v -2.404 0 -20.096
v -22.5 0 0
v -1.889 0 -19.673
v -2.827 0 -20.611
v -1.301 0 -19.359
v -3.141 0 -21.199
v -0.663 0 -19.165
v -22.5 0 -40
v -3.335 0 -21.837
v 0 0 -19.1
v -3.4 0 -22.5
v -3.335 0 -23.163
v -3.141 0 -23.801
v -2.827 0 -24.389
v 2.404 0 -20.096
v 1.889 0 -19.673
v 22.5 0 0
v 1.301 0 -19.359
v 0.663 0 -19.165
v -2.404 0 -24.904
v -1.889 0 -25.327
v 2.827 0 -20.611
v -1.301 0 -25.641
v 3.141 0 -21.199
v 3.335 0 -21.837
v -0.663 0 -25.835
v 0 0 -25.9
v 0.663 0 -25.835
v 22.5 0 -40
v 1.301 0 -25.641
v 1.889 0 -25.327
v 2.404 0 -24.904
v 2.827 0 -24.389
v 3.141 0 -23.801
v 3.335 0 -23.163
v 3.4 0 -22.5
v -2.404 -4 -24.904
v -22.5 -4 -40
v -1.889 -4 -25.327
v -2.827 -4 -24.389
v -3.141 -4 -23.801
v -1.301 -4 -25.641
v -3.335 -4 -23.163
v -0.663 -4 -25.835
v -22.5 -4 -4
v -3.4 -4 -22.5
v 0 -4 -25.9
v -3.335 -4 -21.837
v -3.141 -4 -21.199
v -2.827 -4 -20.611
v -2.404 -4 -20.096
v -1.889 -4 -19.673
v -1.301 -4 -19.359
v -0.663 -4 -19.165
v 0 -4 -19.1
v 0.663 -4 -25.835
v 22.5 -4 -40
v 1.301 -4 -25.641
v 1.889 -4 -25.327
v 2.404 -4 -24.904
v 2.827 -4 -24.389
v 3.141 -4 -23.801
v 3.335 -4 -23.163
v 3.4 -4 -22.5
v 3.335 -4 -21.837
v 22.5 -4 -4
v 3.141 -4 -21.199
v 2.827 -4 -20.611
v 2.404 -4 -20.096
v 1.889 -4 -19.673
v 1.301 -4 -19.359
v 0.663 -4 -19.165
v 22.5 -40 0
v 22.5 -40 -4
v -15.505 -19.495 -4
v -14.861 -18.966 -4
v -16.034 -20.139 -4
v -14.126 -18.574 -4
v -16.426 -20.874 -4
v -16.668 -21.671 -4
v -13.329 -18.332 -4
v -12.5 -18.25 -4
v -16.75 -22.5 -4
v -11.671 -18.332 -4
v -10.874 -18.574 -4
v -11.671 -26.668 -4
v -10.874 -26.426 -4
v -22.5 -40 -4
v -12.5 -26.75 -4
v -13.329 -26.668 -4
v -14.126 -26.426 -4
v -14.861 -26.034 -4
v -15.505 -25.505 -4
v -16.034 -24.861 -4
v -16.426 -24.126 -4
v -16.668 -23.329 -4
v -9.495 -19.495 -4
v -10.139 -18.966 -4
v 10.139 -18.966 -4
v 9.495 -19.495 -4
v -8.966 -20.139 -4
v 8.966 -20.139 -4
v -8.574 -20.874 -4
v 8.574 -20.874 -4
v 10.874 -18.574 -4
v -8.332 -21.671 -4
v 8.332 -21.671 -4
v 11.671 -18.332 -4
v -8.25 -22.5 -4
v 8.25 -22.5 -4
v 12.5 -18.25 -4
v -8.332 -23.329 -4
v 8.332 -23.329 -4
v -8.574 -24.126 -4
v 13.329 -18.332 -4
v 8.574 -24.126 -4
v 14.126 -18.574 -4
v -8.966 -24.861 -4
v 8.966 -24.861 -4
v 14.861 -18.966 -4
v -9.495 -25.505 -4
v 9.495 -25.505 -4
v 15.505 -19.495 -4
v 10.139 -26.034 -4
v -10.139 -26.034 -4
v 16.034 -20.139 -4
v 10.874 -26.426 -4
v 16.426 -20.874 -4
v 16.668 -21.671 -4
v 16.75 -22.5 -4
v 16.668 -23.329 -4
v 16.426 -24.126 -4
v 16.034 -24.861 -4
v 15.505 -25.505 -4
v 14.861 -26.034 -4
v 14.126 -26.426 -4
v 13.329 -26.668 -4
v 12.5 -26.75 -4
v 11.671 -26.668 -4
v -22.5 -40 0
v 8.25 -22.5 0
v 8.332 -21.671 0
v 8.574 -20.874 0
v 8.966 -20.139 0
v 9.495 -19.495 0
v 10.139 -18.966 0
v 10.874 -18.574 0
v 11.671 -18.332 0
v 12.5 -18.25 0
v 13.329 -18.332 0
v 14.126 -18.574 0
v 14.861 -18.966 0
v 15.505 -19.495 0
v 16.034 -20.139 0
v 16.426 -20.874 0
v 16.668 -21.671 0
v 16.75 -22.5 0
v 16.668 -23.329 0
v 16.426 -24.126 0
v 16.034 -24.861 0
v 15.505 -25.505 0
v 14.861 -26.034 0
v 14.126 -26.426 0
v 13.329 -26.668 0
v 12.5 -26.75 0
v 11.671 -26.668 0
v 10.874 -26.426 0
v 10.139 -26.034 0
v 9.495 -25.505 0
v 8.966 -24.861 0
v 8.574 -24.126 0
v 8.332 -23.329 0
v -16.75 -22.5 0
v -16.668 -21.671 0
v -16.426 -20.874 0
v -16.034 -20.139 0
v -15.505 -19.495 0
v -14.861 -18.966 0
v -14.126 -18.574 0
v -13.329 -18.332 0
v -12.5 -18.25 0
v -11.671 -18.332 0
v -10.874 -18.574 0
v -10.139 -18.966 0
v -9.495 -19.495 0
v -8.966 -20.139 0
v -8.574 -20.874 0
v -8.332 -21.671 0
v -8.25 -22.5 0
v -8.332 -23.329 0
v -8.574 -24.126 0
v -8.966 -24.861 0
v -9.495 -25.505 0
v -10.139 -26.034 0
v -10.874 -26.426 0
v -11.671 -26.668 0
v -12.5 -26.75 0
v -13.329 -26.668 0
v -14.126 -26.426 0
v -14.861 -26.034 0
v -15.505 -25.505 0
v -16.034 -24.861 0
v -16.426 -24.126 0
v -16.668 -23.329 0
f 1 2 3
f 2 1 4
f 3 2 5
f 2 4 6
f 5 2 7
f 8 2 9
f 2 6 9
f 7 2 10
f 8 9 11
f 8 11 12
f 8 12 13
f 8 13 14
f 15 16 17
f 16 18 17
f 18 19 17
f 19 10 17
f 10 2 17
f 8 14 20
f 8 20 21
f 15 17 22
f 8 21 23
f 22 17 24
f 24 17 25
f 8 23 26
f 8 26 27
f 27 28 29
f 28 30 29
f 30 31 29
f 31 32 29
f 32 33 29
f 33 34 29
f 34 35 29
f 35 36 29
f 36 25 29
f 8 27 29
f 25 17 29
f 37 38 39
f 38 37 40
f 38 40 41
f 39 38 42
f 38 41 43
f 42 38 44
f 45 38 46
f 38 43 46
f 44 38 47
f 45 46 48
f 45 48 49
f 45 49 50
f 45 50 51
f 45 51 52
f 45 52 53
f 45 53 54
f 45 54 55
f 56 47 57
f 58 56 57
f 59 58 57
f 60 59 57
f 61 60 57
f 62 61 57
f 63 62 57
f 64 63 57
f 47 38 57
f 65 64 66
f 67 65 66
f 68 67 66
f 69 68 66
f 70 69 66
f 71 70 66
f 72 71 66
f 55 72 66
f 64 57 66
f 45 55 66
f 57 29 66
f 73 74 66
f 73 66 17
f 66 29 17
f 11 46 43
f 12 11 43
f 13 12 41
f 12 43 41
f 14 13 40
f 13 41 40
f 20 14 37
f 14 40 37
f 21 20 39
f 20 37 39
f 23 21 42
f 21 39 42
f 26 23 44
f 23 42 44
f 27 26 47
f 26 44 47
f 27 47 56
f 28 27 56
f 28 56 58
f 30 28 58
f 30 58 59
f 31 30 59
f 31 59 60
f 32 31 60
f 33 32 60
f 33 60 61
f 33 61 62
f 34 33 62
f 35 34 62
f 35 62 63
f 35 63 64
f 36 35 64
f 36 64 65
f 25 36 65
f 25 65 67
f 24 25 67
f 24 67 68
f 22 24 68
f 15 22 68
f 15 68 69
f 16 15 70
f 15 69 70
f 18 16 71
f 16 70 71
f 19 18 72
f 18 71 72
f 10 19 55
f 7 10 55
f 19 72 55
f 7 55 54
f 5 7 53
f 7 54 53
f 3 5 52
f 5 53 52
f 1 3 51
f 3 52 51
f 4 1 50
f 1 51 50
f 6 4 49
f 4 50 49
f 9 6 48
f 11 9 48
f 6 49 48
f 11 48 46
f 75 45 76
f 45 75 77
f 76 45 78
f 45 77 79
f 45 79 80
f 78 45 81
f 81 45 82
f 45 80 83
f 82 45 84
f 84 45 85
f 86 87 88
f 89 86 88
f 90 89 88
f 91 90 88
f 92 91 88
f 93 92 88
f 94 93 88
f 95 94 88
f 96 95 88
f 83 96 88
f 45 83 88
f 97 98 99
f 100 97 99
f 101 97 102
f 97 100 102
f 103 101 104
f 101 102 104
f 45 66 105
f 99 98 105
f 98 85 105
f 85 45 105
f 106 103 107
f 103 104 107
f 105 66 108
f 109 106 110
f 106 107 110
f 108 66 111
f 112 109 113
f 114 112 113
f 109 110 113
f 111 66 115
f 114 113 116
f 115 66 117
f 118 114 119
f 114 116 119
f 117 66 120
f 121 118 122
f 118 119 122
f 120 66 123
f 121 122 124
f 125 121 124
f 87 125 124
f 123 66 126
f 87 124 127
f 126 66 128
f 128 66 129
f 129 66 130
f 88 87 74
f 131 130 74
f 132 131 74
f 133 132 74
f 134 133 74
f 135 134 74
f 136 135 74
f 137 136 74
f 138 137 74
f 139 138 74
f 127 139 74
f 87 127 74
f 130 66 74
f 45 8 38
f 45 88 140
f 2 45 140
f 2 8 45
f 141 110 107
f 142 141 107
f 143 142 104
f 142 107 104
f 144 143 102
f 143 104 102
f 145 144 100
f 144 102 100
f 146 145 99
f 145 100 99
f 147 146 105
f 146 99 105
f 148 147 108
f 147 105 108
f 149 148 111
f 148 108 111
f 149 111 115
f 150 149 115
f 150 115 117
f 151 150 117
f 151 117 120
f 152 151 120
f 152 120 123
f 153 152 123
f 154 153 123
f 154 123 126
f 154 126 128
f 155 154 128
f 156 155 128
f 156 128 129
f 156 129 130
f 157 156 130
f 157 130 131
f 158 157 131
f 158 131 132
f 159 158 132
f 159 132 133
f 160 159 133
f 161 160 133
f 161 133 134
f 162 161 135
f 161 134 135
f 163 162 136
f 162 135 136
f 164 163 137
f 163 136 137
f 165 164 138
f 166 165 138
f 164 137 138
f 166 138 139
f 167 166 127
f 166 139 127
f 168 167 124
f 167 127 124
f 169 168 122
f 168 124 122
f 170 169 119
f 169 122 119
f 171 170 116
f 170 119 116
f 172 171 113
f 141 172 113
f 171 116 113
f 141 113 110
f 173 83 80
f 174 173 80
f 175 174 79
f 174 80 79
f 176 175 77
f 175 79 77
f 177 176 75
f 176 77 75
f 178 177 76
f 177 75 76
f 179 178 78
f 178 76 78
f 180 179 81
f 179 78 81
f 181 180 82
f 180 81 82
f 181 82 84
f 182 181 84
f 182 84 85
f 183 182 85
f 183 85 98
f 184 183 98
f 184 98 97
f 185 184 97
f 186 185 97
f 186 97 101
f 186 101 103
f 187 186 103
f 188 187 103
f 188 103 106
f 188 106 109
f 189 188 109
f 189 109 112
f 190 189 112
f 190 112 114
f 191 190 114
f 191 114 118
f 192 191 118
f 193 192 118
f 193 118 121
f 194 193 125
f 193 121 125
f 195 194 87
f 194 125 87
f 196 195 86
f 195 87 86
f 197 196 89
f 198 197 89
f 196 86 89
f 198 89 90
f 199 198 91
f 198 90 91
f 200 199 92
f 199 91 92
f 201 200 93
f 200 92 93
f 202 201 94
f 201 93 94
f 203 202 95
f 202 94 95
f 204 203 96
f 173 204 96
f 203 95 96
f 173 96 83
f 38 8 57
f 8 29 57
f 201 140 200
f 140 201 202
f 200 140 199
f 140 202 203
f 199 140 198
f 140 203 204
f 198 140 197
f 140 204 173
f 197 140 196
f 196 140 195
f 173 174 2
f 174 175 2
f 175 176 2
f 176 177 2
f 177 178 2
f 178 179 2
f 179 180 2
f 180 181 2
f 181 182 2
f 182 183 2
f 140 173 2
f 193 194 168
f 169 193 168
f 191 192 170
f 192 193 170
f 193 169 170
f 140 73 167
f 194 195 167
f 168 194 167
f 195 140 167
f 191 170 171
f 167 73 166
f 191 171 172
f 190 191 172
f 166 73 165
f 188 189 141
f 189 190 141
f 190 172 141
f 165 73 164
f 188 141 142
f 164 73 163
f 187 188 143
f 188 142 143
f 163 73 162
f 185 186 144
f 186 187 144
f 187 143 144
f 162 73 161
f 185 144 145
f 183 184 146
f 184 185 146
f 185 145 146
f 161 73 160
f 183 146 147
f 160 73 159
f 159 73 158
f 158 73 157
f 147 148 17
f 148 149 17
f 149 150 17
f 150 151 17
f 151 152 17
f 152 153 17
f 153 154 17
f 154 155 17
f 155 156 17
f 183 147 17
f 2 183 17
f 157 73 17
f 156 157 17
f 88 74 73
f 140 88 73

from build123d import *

# Parameters (mm, degrees)
BOSS_EXTRUDE1_DEPTH        = 22.5
M8_TAPPED_HOLE1_D          = 6.8
F_8_5_8_5_DIAMETER_HOLE2_D = 8.5


with BuildPart() as part:
    # Sketch1 → Boss-Extrude1 (new, symmetric)
    with BuildSketch(Plane(origin=(0, 0, 0), x_dir=(0, 0, -1), z_dir=(1, 0, 0))):
        Polygon((0, -40), (0, 0), (40, 0), (40, -4), (4, -4), (4, -40), align=None)
    extrude(amount=BOSS_EXTRUDE1_DEPTH, both=True)

    # M8 Tapped Hole1 (through all)
    with Locations(Plane(origin=(0, 0, 0), x_dir=(1, 0, 0), z_dir=(0, 1, 0))):
        with Locations((0, 22.5)):
            Hole(M8_TAPPED_HOLE1_D / 2)

    # Ø8.5 (8.5) Diameter Hole2 (through all)
    with Locations(Plane.XY):
        with Locations((-12.5, -22.5), (12.5, -22.5)):
            Hole(F_8_5_8_5_DIAMETER_HOLE2_D / 2)


solid = part.part
